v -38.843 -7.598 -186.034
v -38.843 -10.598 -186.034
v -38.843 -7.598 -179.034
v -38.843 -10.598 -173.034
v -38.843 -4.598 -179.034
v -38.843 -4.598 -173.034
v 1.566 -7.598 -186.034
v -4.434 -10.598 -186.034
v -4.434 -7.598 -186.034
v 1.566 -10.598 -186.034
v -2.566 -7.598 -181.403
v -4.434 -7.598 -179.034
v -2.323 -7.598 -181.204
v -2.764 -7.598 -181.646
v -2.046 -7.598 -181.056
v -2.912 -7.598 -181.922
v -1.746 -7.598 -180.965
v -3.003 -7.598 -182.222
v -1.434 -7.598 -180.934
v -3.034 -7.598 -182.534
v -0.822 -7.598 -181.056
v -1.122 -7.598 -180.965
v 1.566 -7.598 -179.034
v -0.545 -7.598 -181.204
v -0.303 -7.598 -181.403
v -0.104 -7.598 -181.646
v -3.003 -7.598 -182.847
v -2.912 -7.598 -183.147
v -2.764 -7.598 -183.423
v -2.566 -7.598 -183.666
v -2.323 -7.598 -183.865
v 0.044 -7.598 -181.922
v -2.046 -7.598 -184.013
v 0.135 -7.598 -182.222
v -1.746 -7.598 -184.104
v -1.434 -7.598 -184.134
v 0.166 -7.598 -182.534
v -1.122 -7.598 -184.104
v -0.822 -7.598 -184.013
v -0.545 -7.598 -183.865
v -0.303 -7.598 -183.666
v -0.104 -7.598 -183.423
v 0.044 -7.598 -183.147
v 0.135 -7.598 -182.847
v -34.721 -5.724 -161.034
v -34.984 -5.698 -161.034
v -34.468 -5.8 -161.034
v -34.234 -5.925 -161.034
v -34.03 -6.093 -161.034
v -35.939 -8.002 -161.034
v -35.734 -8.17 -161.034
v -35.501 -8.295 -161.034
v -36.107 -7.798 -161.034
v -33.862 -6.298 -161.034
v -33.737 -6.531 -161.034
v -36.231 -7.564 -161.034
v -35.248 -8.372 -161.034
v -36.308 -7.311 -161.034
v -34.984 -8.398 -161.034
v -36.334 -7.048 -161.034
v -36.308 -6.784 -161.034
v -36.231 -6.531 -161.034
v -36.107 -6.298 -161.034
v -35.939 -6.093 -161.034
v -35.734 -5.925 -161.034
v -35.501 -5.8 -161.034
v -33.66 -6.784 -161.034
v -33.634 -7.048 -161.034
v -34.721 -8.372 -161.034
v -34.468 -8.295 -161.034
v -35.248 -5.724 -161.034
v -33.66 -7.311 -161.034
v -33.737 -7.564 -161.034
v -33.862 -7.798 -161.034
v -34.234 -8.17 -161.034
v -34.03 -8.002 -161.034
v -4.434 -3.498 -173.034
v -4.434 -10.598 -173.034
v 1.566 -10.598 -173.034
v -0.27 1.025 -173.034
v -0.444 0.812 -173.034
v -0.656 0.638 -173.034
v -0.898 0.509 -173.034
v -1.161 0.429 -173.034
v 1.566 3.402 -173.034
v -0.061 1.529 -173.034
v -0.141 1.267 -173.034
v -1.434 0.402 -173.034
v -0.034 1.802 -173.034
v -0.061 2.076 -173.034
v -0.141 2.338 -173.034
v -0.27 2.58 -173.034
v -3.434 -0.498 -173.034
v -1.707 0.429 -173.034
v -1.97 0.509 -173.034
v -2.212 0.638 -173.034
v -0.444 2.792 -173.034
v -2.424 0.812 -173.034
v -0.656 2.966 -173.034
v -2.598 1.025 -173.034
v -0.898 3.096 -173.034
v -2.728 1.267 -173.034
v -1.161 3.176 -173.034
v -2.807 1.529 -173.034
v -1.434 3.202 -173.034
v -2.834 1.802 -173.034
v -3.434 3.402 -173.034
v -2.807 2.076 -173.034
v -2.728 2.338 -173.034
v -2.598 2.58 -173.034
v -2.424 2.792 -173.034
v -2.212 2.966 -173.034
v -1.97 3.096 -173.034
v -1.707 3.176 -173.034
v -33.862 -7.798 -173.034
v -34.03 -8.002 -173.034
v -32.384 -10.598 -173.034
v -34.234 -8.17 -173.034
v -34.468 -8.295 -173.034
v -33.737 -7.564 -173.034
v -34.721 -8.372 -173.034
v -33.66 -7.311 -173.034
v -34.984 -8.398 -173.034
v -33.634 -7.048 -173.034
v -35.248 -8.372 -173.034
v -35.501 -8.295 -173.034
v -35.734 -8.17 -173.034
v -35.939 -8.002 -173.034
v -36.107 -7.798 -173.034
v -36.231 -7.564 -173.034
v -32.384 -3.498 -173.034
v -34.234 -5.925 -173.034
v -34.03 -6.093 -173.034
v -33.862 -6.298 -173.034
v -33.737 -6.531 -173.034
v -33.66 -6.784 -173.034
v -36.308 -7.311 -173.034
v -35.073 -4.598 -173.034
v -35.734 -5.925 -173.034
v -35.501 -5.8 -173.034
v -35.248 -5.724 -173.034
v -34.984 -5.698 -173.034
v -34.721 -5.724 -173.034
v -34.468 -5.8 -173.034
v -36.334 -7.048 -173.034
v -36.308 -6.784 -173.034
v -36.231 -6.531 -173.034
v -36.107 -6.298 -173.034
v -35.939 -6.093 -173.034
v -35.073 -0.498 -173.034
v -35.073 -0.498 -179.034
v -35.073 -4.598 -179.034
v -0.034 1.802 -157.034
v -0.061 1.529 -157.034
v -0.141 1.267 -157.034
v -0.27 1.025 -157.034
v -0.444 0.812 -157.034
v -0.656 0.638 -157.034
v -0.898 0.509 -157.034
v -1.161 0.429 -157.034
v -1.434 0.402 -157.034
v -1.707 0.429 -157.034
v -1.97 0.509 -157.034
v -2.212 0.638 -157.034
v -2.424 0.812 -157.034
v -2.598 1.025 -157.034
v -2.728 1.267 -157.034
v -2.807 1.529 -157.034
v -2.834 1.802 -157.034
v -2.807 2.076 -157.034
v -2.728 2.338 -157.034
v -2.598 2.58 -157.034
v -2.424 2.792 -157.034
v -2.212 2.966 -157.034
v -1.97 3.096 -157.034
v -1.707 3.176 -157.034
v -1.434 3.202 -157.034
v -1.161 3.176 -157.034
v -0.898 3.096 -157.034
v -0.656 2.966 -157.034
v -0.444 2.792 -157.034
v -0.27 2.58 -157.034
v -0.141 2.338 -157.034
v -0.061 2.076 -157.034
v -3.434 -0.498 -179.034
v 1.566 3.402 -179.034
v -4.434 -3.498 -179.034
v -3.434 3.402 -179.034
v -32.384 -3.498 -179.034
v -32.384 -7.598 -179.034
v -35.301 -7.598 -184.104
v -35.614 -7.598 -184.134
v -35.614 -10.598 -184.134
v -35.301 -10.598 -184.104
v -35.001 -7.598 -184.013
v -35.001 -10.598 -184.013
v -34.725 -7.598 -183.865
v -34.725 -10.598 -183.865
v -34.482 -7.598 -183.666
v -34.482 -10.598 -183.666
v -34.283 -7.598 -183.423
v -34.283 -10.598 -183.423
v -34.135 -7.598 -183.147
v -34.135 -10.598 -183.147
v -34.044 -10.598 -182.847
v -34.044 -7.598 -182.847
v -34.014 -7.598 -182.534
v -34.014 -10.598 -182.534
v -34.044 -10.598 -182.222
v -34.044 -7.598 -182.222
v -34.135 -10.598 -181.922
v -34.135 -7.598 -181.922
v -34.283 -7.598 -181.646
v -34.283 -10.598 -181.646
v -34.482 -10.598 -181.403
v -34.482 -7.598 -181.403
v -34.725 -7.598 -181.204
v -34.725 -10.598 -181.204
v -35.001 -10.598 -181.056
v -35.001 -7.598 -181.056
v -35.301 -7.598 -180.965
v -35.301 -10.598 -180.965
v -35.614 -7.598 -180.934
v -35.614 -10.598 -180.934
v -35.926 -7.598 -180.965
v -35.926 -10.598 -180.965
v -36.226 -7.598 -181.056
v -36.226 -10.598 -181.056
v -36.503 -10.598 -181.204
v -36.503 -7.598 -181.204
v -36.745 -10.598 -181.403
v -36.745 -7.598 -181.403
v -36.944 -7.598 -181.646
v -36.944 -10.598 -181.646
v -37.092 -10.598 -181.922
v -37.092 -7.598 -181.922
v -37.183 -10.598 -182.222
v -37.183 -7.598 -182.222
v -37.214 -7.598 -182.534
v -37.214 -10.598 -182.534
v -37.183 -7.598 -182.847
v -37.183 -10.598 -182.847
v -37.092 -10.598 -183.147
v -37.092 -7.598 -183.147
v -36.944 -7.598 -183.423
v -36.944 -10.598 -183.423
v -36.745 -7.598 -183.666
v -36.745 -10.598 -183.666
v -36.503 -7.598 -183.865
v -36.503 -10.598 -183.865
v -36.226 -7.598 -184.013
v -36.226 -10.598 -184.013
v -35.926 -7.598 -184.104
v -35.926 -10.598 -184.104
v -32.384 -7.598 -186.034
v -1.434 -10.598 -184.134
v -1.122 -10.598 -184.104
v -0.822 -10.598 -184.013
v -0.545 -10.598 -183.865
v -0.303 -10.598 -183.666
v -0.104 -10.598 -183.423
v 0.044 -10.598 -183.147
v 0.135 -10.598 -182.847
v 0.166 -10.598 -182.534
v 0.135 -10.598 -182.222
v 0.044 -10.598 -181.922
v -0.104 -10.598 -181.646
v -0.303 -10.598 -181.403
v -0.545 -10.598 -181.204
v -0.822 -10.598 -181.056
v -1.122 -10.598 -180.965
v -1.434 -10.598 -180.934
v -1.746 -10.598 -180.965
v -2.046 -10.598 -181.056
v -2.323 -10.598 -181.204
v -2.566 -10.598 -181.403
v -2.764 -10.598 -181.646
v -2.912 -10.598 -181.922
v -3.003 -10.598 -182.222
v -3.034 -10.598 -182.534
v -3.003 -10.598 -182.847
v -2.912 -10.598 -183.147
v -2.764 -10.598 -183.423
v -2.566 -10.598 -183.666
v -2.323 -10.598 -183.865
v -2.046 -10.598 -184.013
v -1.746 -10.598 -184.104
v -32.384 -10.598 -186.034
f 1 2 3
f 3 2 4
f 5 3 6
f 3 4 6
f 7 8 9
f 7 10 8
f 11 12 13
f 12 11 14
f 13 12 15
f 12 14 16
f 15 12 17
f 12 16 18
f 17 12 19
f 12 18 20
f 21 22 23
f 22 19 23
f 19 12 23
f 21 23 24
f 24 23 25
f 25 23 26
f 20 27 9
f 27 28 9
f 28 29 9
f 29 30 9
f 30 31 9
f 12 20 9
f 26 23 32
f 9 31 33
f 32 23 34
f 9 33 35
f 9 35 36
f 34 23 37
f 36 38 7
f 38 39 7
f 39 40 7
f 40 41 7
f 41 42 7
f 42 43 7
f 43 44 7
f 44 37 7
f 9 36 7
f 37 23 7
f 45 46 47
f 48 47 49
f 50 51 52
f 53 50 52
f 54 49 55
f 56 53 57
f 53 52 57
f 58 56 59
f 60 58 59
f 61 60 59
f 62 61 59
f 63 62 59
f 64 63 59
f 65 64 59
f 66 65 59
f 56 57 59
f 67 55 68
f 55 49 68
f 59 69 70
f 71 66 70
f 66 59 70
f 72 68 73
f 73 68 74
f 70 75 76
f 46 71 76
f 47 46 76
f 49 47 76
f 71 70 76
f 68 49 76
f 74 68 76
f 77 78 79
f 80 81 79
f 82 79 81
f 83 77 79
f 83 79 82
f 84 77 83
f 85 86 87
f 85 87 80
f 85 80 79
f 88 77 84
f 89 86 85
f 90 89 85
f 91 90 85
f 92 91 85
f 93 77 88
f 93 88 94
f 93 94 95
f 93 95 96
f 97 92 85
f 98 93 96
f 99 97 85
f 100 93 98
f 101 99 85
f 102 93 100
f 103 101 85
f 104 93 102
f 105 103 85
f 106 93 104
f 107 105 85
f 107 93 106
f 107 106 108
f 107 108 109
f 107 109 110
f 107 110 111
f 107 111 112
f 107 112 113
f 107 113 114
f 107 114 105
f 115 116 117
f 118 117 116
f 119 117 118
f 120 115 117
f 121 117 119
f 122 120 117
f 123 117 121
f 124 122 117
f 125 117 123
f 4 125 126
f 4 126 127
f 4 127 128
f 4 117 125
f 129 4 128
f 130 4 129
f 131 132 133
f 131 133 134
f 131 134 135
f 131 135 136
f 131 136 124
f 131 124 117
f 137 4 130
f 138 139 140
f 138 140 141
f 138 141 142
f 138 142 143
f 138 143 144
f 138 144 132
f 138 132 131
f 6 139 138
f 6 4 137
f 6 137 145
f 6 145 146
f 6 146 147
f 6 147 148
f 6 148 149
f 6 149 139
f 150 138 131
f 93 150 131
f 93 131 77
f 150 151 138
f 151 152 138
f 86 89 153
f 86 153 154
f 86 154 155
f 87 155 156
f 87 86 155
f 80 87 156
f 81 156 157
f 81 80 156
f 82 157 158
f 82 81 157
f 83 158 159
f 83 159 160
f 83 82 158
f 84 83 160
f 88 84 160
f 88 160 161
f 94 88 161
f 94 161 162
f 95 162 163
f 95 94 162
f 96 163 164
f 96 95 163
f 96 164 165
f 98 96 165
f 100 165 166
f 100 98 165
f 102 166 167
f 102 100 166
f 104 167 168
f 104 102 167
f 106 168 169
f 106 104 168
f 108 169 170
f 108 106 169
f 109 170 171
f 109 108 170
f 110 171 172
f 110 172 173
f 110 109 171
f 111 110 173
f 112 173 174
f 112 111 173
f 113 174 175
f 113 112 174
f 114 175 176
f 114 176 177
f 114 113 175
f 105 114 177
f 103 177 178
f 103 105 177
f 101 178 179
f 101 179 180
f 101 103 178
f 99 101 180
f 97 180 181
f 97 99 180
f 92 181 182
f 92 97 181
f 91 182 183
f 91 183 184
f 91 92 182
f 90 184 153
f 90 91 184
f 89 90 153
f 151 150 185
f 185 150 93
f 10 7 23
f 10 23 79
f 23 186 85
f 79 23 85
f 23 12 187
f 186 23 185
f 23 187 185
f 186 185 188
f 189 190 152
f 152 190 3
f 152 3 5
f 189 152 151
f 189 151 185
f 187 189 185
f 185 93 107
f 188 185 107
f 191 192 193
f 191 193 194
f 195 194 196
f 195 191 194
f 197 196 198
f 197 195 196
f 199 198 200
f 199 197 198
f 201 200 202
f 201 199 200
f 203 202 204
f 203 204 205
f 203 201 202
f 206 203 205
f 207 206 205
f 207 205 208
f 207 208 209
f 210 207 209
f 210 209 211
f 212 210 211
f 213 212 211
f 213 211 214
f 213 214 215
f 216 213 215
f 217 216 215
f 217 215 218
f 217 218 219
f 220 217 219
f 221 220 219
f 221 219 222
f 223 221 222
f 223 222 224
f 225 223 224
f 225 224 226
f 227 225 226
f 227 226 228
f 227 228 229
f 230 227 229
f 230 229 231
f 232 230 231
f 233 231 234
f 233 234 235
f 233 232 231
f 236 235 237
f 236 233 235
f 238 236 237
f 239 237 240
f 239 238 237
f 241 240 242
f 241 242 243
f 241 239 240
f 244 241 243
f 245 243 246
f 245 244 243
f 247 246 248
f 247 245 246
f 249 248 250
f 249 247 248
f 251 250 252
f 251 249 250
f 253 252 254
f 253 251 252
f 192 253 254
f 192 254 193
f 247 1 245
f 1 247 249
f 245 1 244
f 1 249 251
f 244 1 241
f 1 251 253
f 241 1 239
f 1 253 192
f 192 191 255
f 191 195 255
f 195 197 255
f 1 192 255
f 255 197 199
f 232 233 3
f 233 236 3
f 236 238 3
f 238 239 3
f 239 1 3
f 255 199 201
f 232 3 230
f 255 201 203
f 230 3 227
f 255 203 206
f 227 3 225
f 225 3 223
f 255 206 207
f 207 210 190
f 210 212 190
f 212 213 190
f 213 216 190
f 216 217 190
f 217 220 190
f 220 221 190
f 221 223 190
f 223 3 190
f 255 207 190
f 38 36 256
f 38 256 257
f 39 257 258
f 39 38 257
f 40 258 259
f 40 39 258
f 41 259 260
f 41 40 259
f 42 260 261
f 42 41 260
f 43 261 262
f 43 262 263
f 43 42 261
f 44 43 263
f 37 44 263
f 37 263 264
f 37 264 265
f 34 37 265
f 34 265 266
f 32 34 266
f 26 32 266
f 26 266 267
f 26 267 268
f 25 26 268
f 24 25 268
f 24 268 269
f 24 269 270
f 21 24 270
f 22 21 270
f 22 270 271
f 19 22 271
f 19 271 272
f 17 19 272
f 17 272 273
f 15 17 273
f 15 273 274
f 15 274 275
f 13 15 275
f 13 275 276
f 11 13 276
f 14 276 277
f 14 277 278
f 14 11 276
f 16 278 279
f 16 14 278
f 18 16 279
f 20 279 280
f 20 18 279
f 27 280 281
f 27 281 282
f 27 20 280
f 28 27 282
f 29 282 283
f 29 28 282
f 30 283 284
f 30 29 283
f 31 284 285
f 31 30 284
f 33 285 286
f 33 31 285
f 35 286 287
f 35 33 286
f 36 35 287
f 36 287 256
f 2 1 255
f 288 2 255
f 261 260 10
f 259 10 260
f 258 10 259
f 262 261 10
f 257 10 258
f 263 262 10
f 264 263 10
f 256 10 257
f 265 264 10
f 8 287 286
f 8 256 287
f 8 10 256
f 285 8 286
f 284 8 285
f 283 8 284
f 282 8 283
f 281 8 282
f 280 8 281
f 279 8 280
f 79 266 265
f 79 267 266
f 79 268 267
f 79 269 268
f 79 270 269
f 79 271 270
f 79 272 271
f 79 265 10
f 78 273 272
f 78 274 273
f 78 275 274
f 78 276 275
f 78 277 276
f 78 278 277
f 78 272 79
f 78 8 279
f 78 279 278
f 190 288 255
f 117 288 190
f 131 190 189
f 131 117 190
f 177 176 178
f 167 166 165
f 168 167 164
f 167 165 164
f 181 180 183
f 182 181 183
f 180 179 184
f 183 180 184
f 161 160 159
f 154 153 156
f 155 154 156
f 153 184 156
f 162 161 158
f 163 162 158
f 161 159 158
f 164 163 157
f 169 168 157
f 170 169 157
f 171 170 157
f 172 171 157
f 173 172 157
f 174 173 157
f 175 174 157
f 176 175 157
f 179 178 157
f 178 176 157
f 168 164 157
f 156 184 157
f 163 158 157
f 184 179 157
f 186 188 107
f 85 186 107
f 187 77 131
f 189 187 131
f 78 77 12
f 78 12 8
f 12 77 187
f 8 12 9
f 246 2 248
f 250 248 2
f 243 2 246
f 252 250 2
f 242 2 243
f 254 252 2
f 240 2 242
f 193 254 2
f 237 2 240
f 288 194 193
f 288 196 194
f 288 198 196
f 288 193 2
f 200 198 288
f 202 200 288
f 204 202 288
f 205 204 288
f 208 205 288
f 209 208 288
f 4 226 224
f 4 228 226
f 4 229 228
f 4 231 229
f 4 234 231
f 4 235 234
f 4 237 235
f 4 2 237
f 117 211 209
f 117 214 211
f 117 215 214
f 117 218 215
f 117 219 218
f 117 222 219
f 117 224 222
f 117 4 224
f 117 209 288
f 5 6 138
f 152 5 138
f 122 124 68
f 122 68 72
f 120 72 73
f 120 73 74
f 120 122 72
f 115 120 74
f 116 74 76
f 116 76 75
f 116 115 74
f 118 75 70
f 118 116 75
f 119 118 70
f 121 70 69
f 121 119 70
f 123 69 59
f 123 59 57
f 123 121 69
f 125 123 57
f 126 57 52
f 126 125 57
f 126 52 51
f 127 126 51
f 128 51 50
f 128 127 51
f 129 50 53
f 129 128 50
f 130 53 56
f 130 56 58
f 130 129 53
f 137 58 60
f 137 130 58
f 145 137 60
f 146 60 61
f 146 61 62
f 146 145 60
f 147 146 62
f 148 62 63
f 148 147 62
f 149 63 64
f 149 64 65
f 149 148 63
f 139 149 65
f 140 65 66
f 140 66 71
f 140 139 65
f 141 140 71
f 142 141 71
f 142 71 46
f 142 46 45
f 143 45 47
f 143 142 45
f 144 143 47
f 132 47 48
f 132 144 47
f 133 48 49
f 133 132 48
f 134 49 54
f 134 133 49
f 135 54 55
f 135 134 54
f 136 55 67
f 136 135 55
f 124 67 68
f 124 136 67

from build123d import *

# Parameters (mm, degrees)
SKETCH1_W            = 4
SKETCH1_H            = 14
BOSS_EXTRUDE1_DEPTH  = 3
SKETCH2_R            = 1.4
BOSS_EXTRUDE2_DEPTH  = 16
SKETCH3_W            = 4
SKETCH3_H            = 1
BOSS_EXTRUDE4_DEPTH  = 6
SKETCH7_W            = 3
SKETCH7_H            = 2
BOSS_EXTRUDE5_DEPTH  = 30.95
SKETCH8_W            = 3
SKETCH8_H            = 2
BOSS_EXTRUDE6_DEPTH  = 1
SKETCH9_W            = 1
SKETCH9_H            = 2
BOSS_EXTRUDE7_DEPTH  = 3
SKETCH10_W           = 1
SKETCH10_H           = 2
BOSS_EXTRUDE8_DEPTH  = 5.92
SKETCH11_W           = 1
SKETCH11_H           = 2
BOSS_EXTRUDE9_DEPTH  = 4
SKETCH12_W           = 1
SKETCH12_H           = 3
BOSS_EXTRUDE14_DEPTH = 0.93
SKETCH13_W           = 3
SKETCH13_H           = 3
BOSS_EXTRUDE15_DEPTH = 7.1
SKETCH14_W           = 3.33402541
SKETCH14_H           = 13.860919233
CUT_EXTRUDE3_DEPTH   = 10
SKETCH15_W           = 6.20666024
SKETCH15_H           = 3.660501205
CUT_EXTRUDE4_DEPTH   = 10
SKETCH16_W           = 3
SKETCH16_H           = 9.1
BOSS_EXTRUDE16_DEPTH = 0.12
SKETCH18_W           = 3
SKETCH18_H           = 9.1
BOSS_EXTRUDE18_DEPTH = 0.41
SKETCH19_W           = 3
SKETCH19_H           = 9.1
BOSS_EXTRUDE19_DEPTH = 0.89
SKETCH20_W           = 3
SKETCH20_H           = 6
BOSS_EXTRUDE20_DEPTH = 3.77
SKETCH21_R           = 1.35
BOSS_EXTRUDE23_DEPTH = 12
BOSS_EXTRUDE24_DEPTH = 3
SKETCH24_W           = 4
SKETCH24_H           = 1
BOSS_EXTRUDE25_DEPTH = 4
SKETCH25_W           = 4
SKETCH25_H           = 7
BOSS_EXTRUDE26_DEPTH = 2
SKETCH26_W           = 6.458993184
SKETCH26_H           = 3
BOSS_EXTRUDE27_DEPTH = 7
SKETCH27_R           = 1.6
CUT_EXTRUDE5_DEPTH   = 7
SKETCH28_R           = 1.6
CUT_EXTRUDE6_DEPTH   = 7
SKETCH30_W           = 7
SKETCH30_H           = 3
BOSS_EXTRUDE29_DEPTH = 1
SKETCH31_W           = 7
SKETCH31_H           = 3
BOSS_EXTRUDE30_DEPTH = 1
SKETCH32_W           = 6
SKETCH32_H           = 7.1
BOSS_EXTRUDE31_DEPTH = 1
SKETCH33_W           = 31.638993184
SKETCH33_H           = 6
BOSS_EXTRUDE32_DEPTH = 1
SKETCH34_W           = 6
SKETCH34_H           = 14
BOSS_EXTRUDE33_DEPTH = 1


with BuildPart() as part:
    # Sketch1 → Boss-Extrude1 (new body)
    with BuildSketch(Plane.XY):
        with Locations((-1.434146341, -3.597560976)):
            Rectangle(SKETCH1_W, SKETCH1_H)
    extrude(amount=BOSS_EXTRUDE1_DEPTH)

    # Sketch2 → Boss-Extrude2 (add)
    with BuildSketch(Plane(origin=(0, 0, 0), x_dir=(-1, 0, 0), z_dir=(0, 0, -1))):
        with Locations(Location((1.434146341, 1.802439024, 0), (0, 0, 180))):
            Circle(SKETCH2_R)
    extrude(amount=BOSS_EXTRUDE2_DEPTH)

    # Sketch3 → Boss-Extrude4 (add)
    with BuildSketch(Plane.XY.offset(3)):
        with Locations((-1.434146341, -10.097560976)):
            Rectangle(SKETCH3_W, SKETCH3_H)
    extrude(amount=BOSS_EXTRUDE4_DEPTH)

    # Sketch7 → Boss-Extrude5 (add)
    with BuildSketch(Plane.ZY.offset(3.434146341)):
        with Locations((1.5, -2.497560976)):
            Rectangle(SKETCH7_W, SKETCH7_H)
    extrude(amount=BOSS_EXTRUDE5_DEPTH)

    # Sketch8 → Boss-Extrude6 (add)
    with BuildSketch(Plane.ZY.offset(34.384146341)):
        with Locations((1.5, -2.497560976)):
            Rectangle(SKETCH8_W, SKETCH8_H)
    extrude(amount=BOSS_EXTRUDE6_DEPTH)

    # Sketch9 → Boss-Extrude7 (add)
    with BuildSketch(Plane(origin=(0, 0, 0), x_dir=(-1, 0, 0), z_dir=(0, 0, -1))):
        with Locations((34.884146341, -2.497560976)):
            Rectangle(SKETCH9_W, SKETCH9_H)
    extrude(amount=BOSS_EXTRUDE7_DEPTH)

    # Sketch10 → Boss-Extrude8 (add)
    with BuildSketch(Plane(origin=(0, 0, -3), x_dir=(-1, 0, 0), z_dir=(0, 0, -1))):
        with Locations((34.884146341, -2.497560976)):
            Rectangle(SKETCH10_W, SKETCH10_H)
    extrude(amount=BOSS_EXTRUDE8_DEPTH)

    # Sketch11 → Boss-Extrude9 (add)
    with BuildSketch(Plane(origin=(0, 0, -8.92), x_dir=(-1, 0, 0), z_dir=(0, 0, -1))):
        with Locations((34.884146341, -2.497560976)):
            Rectangle(SKETCH11_W, SKETCH11_H)
    extrude(amount=BOSS_EXTRUDE9_DEPTH)

    # Sketch12 → Boss-Extrude14 (add)
    with BuildSketch(Plane.XZ.offset(3.497560976)):
        with Locations((-34.884146341, -9.28)):
            Rectangle(SKETCH12_W, SKETCH12_H)
    extrude(amount=BOSS_EXTRUDE14_DEPTH)

    # Sketch13 → Boss-Extrude15 (add)
    with BuildSketch(Plane.XZ.offset(3.497560976)):
        with Locations((-33.884146341, 1.5)):
            Rectangle(SKETCH13_W, SKETCH13_H)
    extrude(amount=BOSS_EXTRUDE15_DEPTH)

    # Sketch14 → Cut-Extrude3 (cut)
    with BuildSketch(Plane.XY.offset(3)):
        with Locations((-35.32015223, -3.66710136)):
            Rectangle(SKETCH14_W, SKETCH14_H)
    extrude(amount=-CUT_EXTRUDE3_DEPTH, mode=Mode.SUBTRACT)


with BuildPart() as cut_extrude3_piece_1:
    # of the separate pieces the step leaves, piece 1, a body of its own (cut_extrude3_pieces)
    add(part.part.solids().sort_by_distance((-3.434146341, 3.402439024, 0))[0])

    # Sketch16 → Boss-Extrude16 (add)
    with BuildSketch(Plane.ZY.offset(33.653139525)):
        with Locations((1.5, -6.047560976)):
            Rectangle(SKETCH16_W, SKETCH16_H)
    extrude(amount=BOSS_EXTRUDE16_DEPTH)

    # Sketch18 → Boss-Extrude18 (add)
    with BuildSketch(Plane.ZY.offset(33.773139525)):
        with Locations((1.5, -6.047560976)):
            Rectangle(SKETCH18_W, SKETCH18_H)
    extrude(amount=BOSS_EXTRUDE18_DEPTH)

    # Sketch19 → Boss-Extrude19 (add)
    with BuildSketch(Plane.ZY.offset(34.183139525)):
        with Locations((1.5, -6.047560976)):
            Rectangle(SKETCH19_W, SKETCH19_H)
    extrude(amount=BOSS_EXTRUDE19_DEPTH)

    # Sketch20 → Boss-Extrude20 (add)
    with BuildSketch(Plane.ZY.offset(35.073139525)):
        with Locations((1.5, -7.597560976)):
            Rectangle(SKETCH20_W, SKETCH20_H)
    extrude(amount=BOSS_EXTRUDE20_DEPTH)

    # Sketch21 → Boss-Extrude23 (add)
    with BuildSketch(Plane(origin=(0, 0, 0), x_dir=(-1, 0, 0), z_dir=(0, 0, -1))):
        with Locations(Location((34.984146341, -7.047560976, 0), (0, 0, 180))):
            Circle(SKETCH21_R)
    extrude(amount=BOSS_EXTRUDE23_DEPTH)

    # Sketch23 → Boss-Extrude24 (add)
    with BuildSketch(Plane.XY.offset(3)):
        Polygon((-38.843139525, -10.597560976), (-38.843139525, -4.597560976), (-35.073139525, -4.597560976), (-35.073139525, -1.497560976), (-3.434146341, -1.497560976), (-3.434146341, 3.402439024), (0.565853659, 3.402439024), (0.565853659, -9.597560976), (-3.434146341, -9.597560976), (-3.434146341, -3.497560976), (-32.384146341, -3.497560976), (-32.384146341, -10.597560976), align=None)
    extrude(amount=BOSS_EXTRUDE24_DEPTH)

    # Sketch24 → Boss-Extrude25 (add)
    with BuildSketch(Plane.XY.offset(9)):
        with Locations((-1.434146341, -10.097560976)):
            Rectangle(SKETCH24_W, SKETCH24_H)
    extrude(amount=BOSS_EXTRUDE25_DEPTH)

    # Sketch25 → Boss-Extrude26 (add)
    with BuildSketch(Plane(origin=(0, -9.597560976, 0), x_dir=(1, 0, 0), z_dir=(0, 1, 0))):
        with Locations((-1.434146341, -9.5)):
            Rectangle(SKETCH25_W, SKETCH25_H)
    extrude(amount=BOSS_EXTRUDE26_DEPTH)

    # Sketch26 → Boss-Extrude27 (add)
    with BuildSketch(Plane.XY.offset(6)):
        with Locations((-35.613642933, -9.097560976)):
            Rectangle(SKETCH26_W, SKETCH26_H)
    extrude(amount=BOSS_EXTRUDE27_DEPTH)

    # Sketch27 → Cut-Extrude5 (cut)
    with BuildSketch(Plane(origin=(0, -7.597560976, 0), x_dir=(1, 0, 0), z_dir=(0, 1, 0))):
        with Locations(Location((-35.613642933, -9.5, 0), (0, 0, 270))):
            Circle(SKETCH27_R)
    extrude(amount=-CUT_EXTRUDE5_DEPTH, mode=Mode.SUBTRACT)

    # Sketch28 → Cut-Extrude6 (cut)
    with BuildSketch(Plane(origin=(0, -7.597560976, 0), x_dir=(1, 0, 0), z_dir=(0, 1, 0))):
        with Locations(Location((-1.434146341, -9.5, 0), (0, 0, 270))):
            Circle(SKETCH28_R)
    extrude(amount=-CUT_EXTRUDE6_DEPTH, mode=Mode.SUBTRACT)

    # Sketch30 → Boss-Extrude29 (add)
    with BuildSketch(Plane(origin=(0.565853659, 0, 0), x_dir=(0, 0, -1), z_dir=(1, 0, 0))):
        with Locations((-9.5, -9.097560976)):
            Rectangle(SKETCH30_W, SKETCH30_H)
    extrude(amount=BOSS_EXTRUDE29_DEPTH)

    # Sketch31 → Boss-Extrude30 (add)
    with BuildSketch(Plane.ZY.offset(3.434146341)):
        with Locations((9.5, -9.097560976)):
            Rectangle(SKETCH31_W, SKETCH31_H)
    extrude(amount=BOSS_EXTRUDE30_DEPTH)

    # Sketch32 → Boss-Extrude31 (add)
    with BuildSketch(Plane.ZY.offset(3.434146341)):
        with Locations((3, -7.047560976)):
            Rectangle(SKETCH32_W, SKETCH32_H)
    extrude(amount=BOSS_EXTRUDE31_DEPTH)

    # Sketch33 → Boss-Extrude32 (add)
    with BuildSketch(Plane(origin=(0, -1.497560976, 0), x_dir=(1, 0, 0), z_dir=(0, 1, 0))):
        with Locations((-19.253642933, -3)):
            Rectangle(SKETCH33_W, SKETCH33_H)
    extrude(amount=BOSS_EXTRUDE32_DEPTH)

    # Sketch34 → Boss-Extrude33 (add)
    with BuildSketch(Plane(origin=(0.565853659, 0, 0), x_dir=(0, 0, -1), z_dir=(1, 0, 0))):
        with Locations((-3, -3.597560976)):
            Rectangle(SKETCH34_W, SKETCH34_H)
    extrude(amount=BOSS_EXTRUDE33_DEPTH)


with BuildPart() as cut_extrude3_piece_2:
    # of the separate pieces the step leaves, piece 2, a body of its own (cut_extrude3_pieces)
    add(part.part.solids().sort_by_distance((-34.384146341, -1.497560976, -7))[0])

    # Sketch15 → Cut-Extrude4 (cut)
    with BuildSketch(Plane.ZY.offset(35.384146341)):
        with Locations((-9.81666988, -3.327811578)):
            Rectangle(SKETCH15_W, SKETCH15_H)
    extrude(amount=-CUT_EXTRUDE4_DEPTH, mode=Mode.SUBTRACT)


with BuildPart() as body_2:
    # Mirror1: mirrored copy
    add(cut_extrude3_piece_1.part.mirror(Plane.XY.offset(-86.517216343)))


solid = body_2.part
